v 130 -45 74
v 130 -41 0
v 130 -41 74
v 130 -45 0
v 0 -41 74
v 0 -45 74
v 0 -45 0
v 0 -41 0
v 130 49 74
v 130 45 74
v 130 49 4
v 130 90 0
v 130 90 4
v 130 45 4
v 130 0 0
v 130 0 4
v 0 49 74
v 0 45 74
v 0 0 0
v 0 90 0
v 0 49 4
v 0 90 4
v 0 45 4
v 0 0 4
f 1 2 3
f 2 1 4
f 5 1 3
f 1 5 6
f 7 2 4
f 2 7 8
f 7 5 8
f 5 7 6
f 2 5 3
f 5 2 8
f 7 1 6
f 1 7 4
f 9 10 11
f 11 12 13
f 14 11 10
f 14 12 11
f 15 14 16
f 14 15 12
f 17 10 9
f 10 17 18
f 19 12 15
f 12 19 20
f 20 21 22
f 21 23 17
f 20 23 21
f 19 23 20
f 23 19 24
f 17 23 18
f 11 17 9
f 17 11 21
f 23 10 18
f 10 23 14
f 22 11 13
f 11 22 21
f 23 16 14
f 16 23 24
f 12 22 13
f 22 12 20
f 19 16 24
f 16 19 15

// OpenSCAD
// Rack for six 50 mL conical (Falcon-type) tubes
// Print orientation: Upside down. Flat plate on bed (Z=0).
// After printing, flip over to stand on the two walls.

// --- Dimensions ---
// Plate dimensions
$plate_length = 130; // X dimension
$plate_width = 90;   // Y dimension
$plate_thickness = 4; // Z thickness

// Hole specifications
$hole_count = 6;
$hole_diameter = 30.5;
$hole_spacing_x = 40; // Centre-to-centre along X
$hole_spacing_y = 40; // Centre-to-centre along Y

// Wall specifications
$wall_length = 130;   // X dimension (matches plate length)
$wall_thickness = 4;  // Y dimension (matches plate width)
$wall_height = 70;    // Height from top of plate (Z = 4 to Z = 74)

// --- Configuration ---
$fn = 128; // High resolution for smooth holes and walls

// --- Calculations ---
// Plate center is at (0,0)
// Holes are arranged in 2 rows (Y) of 3 columns (X)
// X positions: -40, 0, 40 (since spacing is 40 and centered)
// Y positions: -20, 20 (since spacing is 40 and centered)
$hole_x_positions = [-40, 0, 40];
$hole_y_positions = [-20, 20];

// Wall positions: Along the two long edges (Y = +/- plate_width/2)
$wall_y_positions = [-($plate_width/2), ($plate_width/2)];

// --- Main Module ---
module tube_rack() {
    union() {
        // 1. The Flat Plate
        // Lies on Z=0 to Z=4
        translate([0, 0, 0])
            cube([
                $plate_length,
                $plate_width,
                $plate_thickness
            ]);

        // 2. The Two Walls
        // Rise from Z=4 to Z=4+$wall_height
        // Located at the two long edges (Y = +/- 45)
        for (y_pos = $wall_y_positions) {
            translate([0, y_pos, 0])
                difference() {
                    // The wall block (including the part inside the plate)
                    translate([0, 0, 0])
                        cube([
                            $wall_length,
                            $wall_thickness,
                            $wall_height + $plate_thickness
                        ]);
                    
                    // Cut out the holes through the walls
                    // We extend the cut slightly to ensure clean removal
                    for (x_pos = $hole_x_positions) {
                        for (y_pos = $hole_y_positions) {
                            translate([x_pos, y_pos, 0])
                                cylinder(
                                    h = $wall_height + $plate_thickness + 0.1,
                                    d = $hole_diameter,
                                    $fn = $fn
                                );
                        }
                    }
                }
        }
    }
}

// Generate the part
tube_rack();
